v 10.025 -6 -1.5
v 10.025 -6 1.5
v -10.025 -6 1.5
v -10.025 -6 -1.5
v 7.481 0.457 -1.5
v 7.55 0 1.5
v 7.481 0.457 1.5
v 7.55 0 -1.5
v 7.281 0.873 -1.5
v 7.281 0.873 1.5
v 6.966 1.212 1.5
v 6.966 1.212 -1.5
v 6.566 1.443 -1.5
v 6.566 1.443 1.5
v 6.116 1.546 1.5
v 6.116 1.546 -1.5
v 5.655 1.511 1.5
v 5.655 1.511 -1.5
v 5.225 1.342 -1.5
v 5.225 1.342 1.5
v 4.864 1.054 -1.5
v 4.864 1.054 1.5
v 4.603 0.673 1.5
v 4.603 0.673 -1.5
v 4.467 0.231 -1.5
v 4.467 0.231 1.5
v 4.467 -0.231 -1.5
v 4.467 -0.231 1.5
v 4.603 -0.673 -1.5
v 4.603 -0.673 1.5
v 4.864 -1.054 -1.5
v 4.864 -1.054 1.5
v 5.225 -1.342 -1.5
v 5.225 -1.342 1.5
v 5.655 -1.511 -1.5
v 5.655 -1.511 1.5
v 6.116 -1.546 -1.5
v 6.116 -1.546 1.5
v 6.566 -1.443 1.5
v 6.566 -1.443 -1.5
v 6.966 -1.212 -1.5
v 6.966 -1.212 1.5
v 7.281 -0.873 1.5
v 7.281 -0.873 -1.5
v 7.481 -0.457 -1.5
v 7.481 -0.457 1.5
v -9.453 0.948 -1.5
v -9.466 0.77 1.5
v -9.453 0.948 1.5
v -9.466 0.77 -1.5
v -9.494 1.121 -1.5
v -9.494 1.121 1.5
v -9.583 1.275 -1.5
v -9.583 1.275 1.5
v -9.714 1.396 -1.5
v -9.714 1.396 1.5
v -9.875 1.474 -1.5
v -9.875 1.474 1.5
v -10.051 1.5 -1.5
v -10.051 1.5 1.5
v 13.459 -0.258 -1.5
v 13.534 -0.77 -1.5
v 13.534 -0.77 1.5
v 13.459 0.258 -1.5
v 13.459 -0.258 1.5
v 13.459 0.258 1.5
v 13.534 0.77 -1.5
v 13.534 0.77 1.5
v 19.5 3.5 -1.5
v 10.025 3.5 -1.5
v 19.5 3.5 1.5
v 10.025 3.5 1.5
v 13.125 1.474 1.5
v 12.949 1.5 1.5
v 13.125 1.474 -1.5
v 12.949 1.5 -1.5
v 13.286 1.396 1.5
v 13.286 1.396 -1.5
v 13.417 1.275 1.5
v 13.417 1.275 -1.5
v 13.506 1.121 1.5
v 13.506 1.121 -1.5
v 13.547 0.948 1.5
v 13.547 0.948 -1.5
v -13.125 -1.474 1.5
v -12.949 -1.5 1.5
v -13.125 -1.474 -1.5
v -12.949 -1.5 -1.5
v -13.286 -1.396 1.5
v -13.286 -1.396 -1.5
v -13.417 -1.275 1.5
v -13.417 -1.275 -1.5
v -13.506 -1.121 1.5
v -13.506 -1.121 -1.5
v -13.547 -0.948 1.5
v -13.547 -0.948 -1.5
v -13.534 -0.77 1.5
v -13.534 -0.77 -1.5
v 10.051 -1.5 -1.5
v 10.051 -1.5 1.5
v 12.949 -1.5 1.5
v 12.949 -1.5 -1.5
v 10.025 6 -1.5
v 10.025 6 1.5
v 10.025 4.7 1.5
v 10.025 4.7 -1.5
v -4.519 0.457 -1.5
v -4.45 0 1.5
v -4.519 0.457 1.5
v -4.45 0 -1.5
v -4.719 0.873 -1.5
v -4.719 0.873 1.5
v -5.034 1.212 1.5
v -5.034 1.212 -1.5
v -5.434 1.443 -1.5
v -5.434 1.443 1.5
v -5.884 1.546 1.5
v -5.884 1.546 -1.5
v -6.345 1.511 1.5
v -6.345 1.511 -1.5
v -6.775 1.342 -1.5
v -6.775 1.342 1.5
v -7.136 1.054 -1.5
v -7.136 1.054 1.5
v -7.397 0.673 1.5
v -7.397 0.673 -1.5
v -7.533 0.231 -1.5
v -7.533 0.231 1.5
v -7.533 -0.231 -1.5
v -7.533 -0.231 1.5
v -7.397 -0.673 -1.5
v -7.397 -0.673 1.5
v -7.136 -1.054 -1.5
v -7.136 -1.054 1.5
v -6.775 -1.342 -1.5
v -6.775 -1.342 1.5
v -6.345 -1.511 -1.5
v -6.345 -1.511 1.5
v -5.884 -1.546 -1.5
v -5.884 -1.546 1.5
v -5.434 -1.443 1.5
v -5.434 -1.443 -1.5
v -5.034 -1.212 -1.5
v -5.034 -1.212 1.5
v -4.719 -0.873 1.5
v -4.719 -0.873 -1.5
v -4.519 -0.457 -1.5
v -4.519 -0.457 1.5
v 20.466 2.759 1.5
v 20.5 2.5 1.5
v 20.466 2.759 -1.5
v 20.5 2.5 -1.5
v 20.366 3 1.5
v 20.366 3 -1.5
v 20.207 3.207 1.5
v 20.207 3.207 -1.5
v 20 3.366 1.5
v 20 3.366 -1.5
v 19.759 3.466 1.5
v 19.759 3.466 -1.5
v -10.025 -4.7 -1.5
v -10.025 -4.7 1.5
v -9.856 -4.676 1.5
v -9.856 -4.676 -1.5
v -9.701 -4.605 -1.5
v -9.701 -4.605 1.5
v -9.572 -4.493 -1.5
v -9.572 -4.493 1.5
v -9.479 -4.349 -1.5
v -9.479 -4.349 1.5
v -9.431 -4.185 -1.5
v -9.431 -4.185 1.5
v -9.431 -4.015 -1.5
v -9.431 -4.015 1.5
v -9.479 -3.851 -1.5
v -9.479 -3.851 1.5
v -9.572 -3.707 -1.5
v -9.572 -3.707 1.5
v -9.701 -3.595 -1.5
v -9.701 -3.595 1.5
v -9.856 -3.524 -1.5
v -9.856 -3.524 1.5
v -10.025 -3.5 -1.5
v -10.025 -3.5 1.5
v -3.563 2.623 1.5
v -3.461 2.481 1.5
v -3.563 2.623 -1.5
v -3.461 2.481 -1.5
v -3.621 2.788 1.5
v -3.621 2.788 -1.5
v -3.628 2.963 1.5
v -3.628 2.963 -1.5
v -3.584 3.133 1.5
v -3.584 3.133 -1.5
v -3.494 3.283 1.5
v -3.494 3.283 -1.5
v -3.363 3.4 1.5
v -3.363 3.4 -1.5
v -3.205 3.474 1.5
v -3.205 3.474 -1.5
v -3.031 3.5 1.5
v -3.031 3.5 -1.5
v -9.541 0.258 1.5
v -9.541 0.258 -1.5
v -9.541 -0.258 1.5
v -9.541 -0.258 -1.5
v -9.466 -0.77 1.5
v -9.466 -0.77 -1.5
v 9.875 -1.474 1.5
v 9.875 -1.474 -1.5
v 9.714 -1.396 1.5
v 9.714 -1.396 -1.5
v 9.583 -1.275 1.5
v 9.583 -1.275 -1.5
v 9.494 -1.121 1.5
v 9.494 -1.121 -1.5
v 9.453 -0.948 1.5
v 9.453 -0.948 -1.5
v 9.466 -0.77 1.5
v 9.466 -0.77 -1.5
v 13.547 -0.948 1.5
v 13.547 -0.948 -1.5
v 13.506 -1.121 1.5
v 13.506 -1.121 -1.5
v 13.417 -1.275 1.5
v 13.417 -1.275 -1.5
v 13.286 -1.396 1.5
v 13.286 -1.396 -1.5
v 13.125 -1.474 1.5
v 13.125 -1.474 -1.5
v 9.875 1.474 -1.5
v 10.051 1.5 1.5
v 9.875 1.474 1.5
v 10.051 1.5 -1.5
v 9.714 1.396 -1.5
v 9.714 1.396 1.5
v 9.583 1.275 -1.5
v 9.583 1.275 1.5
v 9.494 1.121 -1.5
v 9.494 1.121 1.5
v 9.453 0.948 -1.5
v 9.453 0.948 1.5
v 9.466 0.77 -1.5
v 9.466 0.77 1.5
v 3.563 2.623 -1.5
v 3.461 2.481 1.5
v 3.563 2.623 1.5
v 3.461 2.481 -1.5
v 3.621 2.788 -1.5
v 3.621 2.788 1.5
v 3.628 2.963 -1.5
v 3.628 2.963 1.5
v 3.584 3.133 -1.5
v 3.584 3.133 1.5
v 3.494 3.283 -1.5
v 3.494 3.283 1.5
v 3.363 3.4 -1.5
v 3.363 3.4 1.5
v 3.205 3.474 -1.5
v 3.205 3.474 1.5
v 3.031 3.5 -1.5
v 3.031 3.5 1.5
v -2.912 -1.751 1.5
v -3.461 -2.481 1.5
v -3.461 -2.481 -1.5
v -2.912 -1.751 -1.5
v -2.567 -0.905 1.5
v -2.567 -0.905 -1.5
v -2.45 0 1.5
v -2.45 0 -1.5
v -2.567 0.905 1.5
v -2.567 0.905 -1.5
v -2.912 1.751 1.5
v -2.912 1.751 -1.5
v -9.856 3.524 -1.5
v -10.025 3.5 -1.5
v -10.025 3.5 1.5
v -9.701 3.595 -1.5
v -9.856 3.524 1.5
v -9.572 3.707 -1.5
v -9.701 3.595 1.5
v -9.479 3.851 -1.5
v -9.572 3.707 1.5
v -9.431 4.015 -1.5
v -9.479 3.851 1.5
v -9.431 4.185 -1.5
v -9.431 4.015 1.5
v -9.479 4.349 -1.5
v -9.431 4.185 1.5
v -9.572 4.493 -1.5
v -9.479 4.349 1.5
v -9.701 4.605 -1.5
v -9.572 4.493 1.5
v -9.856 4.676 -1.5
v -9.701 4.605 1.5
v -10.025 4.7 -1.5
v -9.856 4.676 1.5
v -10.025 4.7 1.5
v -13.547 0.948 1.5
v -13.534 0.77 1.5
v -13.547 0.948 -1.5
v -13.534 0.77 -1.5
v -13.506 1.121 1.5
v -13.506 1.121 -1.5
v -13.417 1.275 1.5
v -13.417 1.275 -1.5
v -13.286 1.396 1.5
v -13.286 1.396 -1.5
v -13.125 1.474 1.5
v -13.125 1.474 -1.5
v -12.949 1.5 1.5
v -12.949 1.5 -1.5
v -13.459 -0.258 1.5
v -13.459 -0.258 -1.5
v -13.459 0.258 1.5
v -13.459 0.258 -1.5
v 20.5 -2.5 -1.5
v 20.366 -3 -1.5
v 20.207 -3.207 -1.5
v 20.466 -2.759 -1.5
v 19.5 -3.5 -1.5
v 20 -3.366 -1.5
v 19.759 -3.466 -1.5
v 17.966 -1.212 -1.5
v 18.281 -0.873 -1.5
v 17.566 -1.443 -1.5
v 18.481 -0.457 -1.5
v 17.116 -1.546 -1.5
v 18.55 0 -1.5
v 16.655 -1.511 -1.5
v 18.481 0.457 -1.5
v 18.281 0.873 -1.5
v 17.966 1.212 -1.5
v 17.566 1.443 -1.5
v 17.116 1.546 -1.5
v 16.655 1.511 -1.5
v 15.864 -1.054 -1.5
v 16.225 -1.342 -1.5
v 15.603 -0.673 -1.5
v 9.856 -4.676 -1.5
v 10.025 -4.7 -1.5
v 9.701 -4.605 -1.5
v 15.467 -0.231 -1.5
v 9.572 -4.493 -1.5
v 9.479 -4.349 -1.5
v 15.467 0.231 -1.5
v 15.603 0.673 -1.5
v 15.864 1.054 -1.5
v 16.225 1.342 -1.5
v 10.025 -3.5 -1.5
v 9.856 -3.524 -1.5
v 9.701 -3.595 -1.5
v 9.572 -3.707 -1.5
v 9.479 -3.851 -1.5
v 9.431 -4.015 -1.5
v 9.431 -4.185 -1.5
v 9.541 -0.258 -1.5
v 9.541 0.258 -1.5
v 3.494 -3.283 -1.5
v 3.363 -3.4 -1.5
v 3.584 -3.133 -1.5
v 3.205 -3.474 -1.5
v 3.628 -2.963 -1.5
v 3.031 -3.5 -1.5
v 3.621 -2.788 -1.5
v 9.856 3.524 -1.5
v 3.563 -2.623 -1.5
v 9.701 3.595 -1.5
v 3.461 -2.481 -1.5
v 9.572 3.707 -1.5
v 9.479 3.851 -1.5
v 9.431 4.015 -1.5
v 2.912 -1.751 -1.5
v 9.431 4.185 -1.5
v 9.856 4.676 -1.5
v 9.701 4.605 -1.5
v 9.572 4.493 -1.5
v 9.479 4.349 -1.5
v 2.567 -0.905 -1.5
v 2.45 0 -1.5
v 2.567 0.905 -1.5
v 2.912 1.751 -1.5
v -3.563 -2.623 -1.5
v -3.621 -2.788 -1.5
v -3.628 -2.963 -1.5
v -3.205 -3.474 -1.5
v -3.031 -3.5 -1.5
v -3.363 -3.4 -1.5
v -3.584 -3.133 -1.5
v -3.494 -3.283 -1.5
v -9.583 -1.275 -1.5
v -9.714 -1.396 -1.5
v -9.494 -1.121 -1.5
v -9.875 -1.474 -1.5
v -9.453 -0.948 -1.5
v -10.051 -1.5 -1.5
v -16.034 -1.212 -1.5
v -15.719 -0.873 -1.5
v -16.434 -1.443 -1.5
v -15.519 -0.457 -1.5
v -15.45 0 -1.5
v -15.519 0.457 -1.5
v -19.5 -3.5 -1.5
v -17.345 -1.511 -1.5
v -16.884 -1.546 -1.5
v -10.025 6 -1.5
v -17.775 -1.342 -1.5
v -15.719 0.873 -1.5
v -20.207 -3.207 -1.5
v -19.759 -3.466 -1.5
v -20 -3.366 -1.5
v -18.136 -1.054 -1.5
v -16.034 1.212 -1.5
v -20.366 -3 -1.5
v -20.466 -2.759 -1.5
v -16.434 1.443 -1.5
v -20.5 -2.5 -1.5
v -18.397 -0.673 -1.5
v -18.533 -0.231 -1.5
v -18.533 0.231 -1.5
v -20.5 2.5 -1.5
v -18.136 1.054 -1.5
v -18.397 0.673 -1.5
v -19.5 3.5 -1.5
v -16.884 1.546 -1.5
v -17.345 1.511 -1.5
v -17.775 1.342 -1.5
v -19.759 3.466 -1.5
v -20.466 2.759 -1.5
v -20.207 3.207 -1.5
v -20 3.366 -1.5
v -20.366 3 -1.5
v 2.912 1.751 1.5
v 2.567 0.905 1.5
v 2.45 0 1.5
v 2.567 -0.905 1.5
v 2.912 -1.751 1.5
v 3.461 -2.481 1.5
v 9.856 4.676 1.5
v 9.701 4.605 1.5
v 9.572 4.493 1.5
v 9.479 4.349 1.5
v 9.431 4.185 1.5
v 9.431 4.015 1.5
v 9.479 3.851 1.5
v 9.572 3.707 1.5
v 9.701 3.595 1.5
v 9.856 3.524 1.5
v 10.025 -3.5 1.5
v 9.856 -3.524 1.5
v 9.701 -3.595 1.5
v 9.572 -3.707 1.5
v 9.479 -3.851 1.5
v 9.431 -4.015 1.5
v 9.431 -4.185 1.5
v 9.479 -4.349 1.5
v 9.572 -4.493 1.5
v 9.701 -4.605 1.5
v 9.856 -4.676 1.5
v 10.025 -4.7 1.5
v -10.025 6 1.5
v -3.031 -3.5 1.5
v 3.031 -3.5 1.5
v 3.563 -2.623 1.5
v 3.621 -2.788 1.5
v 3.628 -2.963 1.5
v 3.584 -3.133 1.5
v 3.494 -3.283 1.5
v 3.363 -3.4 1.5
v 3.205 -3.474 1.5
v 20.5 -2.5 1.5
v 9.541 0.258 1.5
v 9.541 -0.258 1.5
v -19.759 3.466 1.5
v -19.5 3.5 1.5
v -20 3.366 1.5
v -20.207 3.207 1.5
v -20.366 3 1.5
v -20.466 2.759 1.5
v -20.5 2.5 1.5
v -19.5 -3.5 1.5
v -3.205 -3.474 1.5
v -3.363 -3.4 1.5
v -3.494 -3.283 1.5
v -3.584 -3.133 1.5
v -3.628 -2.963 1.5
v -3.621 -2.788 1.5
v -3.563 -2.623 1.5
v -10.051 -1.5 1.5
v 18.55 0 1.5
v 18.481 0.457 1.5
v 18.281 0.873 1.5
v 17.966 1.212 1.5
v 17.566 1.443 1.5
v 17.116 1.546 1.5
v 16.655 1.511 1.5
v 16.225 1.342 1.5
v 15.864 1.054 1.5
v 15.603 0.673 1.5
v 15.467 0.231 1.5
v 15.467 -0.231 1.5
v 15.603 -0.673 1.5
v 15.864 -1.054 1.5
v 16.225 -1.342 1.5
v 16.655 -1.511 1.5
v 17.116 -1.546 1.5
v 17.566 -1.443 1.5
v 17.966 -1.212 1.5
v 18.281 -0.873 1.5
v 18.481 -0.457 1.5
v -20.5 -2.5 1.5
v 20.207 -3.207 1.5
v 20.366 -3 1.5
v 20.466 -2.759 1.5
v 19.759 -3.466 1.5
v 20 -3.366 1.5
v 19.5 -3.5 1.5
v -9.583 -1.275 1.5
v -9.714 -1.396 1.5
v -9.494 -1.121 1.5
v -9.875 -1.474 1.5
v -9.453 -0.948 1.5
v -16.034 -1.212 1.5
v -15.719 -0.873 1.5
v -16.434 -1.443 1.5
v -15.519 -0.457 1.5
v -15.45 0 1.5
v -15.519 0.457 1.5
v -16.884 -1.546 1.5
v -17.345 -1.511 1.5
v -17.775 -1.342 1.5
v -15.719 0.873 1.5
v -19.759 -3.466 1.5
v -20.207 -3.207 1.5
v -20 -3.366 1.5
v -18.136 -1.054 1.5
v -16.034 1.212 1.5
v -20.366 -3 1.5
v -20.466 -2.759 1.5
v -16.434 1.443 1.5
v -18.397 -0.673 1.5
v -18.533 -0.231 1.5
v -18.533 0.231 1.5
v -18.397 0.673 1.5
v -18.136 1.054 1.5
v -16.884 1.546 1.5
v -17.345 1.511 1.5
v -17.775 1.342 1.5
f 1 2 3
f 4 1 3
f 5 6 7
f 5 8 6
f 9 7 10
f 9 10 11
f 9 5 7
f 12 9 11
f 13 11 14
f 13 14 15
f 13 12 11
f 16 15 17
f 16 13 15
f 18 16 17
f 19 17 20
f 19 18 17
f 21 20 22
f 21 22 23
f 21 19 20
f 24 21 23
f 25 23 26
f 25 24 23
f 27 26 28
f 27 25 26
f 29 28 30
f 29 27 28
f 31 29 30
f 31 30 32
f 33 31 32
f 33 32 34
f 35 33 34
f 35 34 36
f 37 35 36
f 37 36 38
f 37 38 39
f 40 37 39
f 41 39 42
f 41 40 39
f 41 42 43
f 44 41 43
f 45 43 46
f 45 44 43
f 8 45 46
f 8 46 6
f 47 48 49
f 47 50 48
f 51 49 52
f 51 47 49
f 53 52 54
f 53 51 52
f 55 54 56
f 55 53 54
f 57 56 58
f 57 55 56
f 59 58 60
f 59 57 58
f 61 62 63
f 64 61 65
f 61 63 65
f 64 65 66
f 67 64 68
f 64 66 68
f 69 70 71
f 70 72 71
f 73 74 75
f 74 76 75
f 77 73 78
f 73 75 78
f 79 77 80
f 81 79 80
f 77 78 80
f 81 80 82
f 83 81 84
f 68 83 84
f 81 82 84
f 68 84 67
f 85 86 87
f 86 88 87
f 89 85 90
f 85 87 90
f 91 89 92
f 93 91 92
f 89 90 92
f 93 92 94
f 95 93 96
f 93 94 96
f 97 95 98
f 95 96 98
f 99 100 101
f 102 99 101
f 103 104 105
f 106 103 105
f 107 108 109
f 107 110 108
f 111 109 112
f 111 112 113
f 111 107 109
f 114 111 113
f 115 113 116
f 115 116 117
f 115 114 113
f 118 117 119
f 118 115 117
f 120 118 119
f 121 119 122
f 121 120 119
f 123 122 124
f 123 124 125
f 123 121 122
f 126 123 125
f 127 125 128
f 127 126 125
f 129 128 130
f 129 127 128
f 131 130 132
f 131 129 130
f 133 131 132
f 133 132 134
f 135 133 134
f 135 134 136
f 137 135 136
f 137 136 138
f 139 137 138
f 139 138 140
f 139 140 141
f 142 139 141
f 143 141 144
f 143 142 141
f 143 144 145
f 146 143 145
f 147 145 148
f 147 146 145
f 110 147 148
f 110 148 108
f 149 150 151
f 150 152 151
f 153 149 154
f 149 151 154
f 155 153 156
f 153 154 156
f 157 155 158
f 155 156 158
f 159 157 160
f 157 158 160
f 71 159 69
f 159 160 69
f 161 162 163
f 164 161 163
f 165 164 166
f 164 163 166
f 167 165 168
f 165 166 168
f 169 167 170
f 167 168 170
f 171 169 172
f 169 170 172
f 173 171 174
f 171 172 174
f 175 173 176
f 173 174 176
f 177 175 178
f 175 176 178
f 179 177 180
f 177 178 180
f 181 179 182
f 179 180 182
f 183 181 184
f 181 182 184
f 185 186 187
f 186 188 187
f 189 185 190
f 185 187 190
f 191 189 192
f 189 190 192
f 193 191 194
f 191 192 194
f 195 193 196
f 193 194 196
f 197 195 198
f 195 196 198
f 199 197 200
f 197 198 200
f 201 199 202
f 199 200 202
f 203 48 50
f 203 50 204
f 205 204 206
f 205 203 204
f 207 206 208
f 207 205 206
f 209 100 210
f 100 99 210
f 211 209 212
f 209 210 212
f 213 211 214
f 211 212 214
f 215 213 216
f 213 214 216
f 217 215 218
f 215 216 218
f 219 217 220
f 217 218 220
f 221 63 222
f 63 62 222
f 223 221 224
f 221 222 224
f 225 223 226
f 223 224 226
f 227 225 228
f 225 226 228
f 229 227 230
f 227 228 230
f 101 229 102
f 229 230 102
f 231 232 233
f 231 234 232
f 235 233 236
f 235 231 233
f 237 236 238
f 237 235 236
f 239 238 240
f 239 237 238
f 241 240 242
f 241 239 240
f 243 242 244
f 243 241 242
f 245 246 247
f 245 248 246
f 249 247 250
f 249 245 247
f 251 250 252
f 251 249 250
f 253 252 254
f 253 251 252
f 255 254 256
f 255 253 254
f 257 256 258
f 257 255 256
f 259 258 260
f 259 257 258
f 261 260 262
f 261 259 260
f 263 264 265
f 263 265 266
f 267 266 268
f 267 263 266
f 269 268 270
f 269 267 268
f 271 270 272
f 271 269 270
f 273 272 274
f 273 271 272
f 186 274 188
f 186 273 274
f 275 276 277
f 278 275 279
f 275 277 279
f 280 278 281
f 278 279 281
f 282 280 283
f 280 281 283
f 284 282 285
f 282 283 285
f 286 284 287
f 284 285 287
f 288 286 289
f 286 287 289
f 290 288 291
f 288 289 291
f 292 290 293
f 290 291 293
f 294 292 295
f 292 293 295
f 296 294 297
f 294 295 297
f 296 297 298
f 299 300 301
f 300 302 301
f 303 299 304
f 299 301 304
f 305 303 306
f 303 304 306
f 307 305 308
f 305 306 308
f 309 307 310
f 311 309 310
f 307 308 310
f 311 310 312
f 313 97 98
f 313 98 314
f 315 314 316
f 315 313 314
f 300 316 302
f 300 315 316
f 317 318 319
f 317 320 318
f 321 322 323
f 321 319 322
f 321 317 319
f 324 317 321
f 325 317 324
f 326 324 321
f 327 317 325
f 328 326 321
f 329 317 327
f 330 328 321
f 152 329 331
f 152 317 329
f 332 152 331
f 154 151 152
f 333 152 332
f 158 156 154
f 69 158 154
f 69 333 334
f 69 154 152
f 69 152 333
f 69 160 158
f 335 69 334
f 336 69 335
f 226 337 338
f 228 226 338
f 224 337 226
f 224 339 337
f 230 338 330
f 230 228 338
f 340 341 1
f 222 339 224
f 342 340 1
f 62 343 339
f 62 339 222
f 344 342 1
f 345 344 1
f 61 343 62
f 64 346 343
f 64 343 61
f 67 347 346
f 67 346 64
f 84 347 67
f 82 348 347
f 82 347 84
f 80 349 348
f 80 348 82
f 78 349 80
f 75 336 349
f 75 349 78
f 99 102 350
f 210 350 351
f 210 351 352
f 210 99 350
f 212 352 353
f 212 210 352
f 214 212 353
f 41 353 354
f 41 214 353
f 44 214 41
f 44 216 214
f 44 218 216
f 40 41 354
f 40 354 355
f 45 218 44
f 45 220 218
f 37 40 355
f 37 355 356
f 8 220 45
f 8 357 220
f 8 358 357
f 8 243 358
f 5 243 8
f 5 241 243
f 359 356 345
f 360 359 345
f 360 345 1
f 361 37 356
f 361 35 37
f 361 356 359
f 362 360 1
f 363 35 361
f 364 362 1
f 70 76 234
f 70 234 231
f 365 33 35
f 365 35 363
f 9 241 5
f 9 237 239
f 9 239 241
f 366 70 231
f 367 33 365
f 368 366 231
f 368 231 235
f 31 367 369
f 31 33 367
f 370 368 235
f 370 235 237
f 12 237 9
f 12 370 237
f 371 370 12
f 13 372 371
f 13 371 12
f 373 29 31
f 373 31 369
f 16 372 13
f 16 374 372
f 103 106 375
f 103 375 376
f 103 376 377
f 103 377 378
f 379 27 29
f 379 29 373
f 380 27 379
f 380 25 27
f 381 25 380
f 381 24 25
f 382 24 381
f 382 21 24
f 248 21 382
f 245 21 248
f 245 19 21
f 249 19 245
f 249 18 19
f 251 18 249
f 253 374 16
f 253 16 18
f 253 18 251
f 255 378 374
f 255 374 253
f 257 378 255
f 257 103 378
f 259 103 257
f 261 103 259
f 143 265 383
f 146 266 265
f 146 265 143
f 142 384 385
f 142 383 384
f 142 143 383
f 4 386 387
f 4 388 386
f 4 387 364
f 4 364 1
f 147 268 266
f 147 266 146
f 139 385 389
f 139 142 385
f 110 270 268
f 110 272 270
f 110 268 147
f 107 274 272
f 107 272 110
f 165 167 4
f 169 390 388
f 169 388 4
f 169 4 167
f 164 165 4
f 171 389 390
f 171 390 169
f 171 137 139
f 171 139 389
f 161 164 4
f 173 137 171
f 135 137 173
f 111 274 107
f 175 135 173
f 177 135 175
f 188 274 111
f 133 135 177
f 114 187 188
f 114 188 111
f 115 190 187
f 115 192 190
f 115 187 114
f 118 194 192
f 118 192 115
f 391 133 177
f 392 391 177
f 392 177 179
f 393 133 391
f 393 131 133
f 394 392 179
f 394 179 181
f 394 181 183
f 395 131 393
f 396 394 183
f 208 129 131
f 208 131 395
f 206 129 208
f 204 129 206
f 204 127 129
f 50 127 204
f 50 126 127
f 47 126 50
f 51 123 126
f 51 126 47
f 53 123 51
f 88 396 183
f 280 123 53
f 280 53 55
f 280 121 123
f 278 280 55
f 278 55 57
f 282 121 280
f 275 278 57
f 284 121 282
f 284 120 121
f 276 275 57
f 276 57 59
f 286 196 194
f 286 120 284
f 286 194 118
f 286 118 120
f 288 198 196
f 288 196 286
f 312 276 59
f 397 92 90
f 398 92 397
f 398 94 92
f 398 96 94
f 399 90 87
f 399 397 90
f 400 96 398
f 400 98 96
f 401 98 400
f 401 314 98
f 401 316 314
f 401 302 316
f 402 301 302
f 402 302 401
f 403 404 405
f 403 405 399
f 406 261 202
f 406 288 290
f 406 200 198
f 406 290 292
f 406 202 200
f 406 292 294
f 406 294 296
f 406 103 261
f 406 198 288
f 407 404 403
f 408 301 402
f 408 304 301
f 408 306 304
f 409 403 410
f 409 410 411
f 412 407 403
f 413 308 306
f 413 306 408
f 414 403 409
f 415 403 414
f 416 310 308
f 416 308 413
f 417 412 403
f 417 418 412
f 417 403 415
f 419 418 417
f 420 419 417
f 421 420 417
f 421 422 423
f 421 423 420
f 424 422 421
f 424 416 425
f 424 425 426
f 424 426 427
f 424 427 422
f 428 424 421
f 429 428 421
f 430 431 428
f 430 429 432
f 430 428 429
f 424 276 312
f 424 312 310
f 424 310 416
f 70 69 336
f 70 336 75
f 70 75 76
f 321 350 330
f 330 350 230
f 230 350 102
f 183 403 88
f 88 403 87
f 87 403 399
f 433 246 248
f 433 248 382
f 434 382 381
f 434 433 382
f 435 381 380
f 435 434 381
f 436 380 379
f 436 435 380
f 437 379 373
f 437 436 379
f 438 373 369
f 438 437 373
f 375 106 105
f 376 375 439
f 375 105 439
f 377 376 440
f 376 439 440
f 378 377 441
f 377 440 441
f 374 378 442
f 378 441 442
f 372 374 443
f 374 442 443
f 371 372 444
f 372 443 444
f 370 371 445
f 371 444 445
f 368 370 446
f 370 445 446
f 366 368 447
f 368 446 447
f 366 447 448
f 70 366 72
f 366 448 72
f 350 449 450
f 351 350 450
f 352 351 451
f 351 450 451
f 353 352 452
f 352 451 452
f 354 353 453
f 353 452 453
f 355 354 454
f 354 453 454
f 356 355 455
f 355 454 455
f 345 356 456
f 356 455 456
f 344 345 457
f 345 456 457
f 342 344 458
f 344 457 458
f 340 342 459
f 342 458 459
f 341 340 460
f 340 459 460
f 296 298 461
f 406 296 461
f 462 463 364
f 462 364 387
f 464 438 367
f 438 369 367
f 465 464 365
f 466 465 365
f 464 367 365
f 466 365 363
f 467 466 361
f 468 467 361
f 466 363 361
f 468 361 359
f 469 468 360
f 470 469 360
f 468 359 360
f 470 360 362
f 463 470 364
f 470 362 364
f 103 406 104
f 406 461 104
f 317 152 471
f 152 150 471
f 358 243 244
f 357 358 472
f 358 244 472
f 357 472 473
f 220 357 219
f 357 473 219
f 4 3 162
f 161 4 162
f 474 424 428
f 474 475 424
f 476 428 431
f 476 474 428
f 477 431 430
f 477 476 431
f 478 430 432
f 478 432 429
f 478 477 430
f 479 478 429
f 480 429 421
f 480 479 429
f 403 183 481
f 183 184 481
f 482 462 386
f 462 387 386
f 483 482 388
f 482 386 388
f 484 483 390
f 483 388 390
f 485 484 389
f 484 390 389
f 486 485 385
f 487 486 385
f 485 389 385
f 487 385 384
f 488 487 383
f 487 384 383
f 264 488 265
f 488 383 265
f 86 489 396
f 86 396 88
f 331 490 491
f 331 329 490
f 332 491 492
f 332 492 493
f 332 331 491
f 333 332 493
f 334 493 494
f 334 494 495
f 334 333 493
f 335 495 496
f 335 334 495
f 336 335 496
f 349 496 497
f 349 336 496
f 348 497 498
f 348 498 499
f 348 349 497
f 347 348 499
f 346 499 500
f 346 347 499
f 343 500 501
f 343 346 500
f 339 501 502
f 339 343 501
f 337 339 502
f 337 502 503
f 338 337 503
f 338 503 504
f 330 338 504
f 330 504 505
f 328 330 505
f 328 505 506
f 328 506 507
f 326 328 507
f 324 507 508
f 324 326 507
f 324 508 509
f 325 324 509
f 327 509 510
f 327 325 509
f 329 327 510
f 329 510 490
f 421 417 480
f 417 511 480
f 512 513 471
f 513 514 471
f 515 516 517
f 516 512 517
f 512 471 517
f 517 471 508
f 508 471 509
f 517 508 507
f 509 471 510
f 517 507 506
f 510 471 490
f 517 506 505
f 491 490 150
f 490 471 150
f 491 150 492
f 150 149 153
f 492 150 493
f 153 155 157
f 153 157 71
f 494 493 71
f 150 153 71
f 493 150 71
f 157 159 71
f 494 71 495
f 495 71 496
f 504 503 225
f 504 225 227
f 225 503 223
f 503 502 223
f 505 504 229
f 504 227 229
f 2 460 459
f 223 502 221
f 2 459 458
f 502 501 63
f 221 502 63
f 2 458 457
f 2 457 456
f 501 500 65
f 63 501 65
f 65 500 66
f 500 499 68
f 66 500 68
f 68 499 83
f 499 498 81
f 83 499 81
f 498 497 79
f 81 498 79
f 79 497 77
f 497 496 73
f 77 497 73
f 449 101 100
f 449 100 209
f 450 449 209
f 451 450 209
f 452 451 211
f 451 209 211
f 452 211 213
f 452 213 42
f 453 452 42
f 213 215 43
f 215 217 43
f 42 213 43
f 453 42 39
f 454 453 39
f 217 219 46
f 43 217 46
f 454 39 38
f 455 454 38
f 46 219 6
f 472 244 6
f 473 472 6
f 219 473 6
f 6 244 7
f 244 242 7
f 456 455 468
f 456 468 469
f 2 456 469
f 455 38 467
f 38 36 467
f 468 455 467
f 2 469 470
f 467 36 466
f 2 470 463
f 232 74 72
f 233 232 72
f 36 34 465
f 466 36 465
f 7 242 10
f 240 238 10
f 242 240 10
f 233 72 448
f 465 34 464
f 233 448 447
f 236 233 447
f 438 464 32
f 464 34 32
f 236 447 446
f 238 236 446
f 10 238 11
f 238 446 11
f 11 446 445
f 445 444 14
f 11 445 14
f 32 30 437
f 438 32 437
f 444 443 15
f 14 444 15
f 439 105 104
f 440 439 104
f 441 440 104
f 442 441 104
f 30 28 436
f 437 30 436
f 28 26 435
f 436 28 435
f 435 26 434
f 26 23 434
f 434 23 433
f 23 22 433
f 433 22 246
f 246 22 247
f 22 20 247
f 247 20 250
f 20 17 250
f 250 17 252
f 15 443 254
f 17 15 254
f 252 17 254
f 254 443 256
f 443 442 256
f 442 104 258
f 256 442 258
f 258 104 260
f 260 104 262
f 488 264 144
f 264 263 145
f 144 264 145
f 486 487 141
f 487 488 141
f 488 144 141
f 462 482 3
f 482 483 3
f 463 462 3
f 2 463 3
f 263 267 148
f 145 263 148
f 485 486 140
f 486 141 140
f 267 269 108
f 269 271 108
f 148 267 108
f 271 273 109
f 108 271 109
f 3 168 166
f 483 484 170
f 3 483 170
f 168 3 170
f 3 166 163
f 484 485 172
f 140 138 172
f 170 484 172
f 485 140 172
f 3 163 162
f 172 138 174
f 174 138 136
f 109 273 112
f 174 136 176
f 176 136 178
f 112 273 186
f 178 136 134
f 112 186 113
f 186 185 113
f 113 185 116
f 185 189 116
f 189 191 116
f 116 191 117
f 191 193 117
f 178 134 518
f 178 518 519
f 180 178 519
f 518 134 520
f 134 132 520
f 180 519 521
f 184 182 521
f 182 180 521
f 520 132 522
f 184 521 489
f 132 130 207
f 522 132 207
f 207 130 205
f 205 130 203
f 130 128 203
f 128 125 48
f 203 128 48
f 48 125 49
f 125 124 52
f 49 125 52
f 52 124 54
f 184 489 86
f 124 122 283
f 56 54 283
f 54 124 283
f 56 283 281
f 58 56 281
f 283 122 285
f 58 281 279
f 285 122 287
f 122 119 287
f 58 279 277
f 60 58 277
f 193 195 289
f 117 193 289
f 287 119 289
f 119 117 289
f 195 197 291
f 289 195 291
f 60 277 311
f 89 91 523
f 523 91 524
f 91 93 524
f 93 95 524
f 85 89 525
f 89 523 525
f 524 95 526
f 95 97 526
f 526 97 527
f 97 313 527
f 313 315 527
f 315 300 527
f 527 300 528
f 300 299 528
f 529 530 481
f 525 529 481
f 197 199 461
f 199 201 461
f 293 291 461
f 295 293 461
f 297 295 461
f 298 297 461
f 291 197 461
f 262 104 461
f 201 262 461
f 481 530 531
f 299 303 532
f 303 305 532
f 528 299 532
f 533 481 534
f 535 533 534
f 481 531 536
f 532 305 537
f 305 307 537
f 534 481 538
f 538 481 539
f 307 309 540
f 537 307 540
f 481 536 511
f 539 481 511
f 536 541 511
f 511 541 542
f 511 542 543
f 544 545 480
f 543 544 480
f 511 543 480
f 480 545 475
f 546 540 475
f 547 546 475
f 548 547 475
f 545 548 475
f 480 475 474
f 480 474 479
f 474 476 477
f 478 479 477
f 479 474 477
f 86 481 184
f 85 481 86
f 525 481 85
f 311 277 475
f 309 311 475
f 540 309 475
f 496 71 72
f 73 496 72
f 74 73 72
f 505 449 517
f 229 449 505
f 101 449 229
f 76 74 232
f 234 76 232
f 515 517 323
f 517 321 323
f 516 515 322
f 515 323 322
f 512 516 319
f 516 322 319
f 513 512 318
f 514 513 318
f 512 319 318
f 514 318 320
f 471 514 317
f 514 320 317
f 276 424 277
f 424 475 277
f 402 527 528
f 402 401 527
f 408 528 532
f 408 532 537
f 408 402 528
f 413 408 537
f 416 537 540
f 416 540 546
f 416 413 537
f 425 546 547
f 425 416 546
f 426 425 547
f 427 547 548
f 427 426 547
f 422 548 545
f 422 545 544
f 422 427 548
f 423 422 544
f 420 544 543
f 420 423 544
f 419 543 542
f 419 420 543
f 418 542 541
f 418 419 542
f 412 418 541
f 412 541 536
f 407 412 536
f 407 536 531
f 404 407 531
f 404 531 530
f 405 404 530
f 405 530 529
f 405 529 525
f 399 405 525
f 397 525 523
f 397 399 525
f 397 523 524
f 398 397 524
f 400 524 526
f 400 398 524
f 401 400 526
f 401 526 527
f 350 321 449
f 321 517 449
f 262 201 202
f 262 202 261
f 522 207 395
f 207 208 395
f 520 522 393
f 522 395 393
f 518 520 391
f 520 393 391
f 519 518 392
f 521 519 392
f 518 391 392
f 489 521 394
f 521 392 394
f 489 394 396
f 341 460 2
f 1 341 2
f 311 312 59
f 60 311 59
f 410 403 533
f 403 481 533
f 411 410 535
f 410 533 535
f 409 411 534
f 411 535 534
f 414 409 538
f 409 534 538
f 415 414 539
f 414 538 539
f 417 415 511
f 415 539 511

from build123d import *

# Parameters (mm, degrees)
SKETCH_1_R               = 1.55
EXTRUDE_1_DEPTH          = 1.5
SKETCH_2_R               = 0.6
CUT_EXTRUDE_1_DEPTH      = 1
CUT_EXTRUDE_1_DEPTH_BACK = 4
FILLET_1_R               = 1
CUT_EXTRUDE_2_DEPTH      = 4
FILLET_2_R               = 0.6


with BuildPart() as part:
    # 草图1 → 凸台-拉伸1 (new body, symmetric)
    with BuildSketch(Plane.XY):
        Polygon((-20.5, 3.5), (-10.025, 3.5), (-10.025, 6), (10.025, 6), (10.025, 3.5), (20.5, 3.5), (20.5, -3.5), (10.025, -3.5), (10.025, -6), (-10.025, -6), (-10.025, -3.5), (-20.5, -3.5), align=None)
        with Locations((-17, 0)):
            Circle(SKETCH_1_R, mode=Mode.SUBTRACT)
        with Locations((-6, 0)):
            Circle(SKETCH_1_R, mode=Mode.SUBTRACT)
        with Locations((6, 0)):
            Circle(SKETCH_1_R, mode=Mode.SUBTRACT)
        with Locations((17, 0)):
            Circle(SKETCH_1_R, mode=Mode.SUBTRACT)
    extrude(amount=EXTRUDE_1_DEPTH, both=True)

    # 草图2 → 切除-拉伸1 (cut, two sides)
    with BuildSketch(Plane.XY.offset(1.5)) as cut_extrude_1_sk:
        with Locations((-10.025, 4.1)):
            Circle(SKETCH_2_R)
        with Locations((-10.025, -4.1)):
            Circle(SKETCH_2_R)
        with Locations((10.025, 4.1)):
            Circle(SKETCH_2_R)
        with Locations((10.025, -4.1)):
            Circle(SKETCH_2_R)
    extrude(amount=CUT_EXTRUDE_1_DEPTH, mode=Mode.SUBTRACT)
    extrude(cut_extrude_1_sk.sketch, amount=-CUT_EXTRUDE_1_DEPTH_BACK, mode=Mode.SUBTRACT)

    # 圆角1
    fillet_1_edges = [part.edges().sort_by_distance(p)[0] for p in [
        (20.5, -3.5, 0),
        (20.5, 3.5, 0),
        (-20.5, -3.5, 0),
        (-20.5, 3.5, 0),
    ]]
    fillet(fillet_1_edges, radius=FILLET_1_R)

    # 草图4 → 切除-拉伸2 (cut, through all)
    with BuildSketch(Plane.XY.offset(1.5)):
        with BuildLine():
            Line((-13.782469891, 1.5), (-9.217530109, 1.5))
            ThreePointArc((-9.217530109, 1.5), (-9.55, 0), (-9.217530109, -1.5))
            Line((-9.217530109, -1.5), (-13.782469891, -1.5))
            ThreePointArc((-13.782469891, -1.5), (-13.45, 0), (-13.782469891, 1.5))
        make_face()
        with BuildLine():
            Line((-5.406282896, 3.5), (5.406282896, 3.5))
            ThreePointArc((5.406282896, 3.5), (2.45, 0), (5.406282896, -3.5))
            Line((5.406282896, -3.5), (-5.406282896, -3.5))
            ThreePointArc((-5.406282896, -3.5), (-2.45, 0), (-5.406282896, 3.5))
        make_face()
        with BuildLine():
            Line((13.782469891, 1.5), (9.217530109, 1.5))
            ThreePointArc((9.217530109, 1.5), (9.55, 0), (9.217530109, -1.5))
            Line((9.217530109, -1.5), (13.782469891, -1.5))
            ThreePointArc((13.782469891, -1.5), (13.45, 0), (13.782469891, 1.5))
        make_face()
    extrude(amount=-CUT_EXTRUDE_2_DEPTH, mode=Mode.SUBTRACT)

    # 圆角2
    fillet_2_edges = [part.edges().sort_by_distance(p)[0] for p in [
        (-13.782469891, -1.5, 0),
        (-13.782469891, 1.5, 0),
        (-9.217530109, 1.5, 0),
        (-9.217530109, -1.5, 0),
        (-5.406282896, -3.5, 0),
        (-5.406282896, 3.5, 0),
        (5.406282896, 3.5, 0),
        (5.406282896, -3.5, 0),
        (13.782469891, 1.5, 0),
        (13.782469891, -1.5, 0),
        (9.217530109, -1.5, 0),
        (9.217530109, 1.5, 0),
    ]]
    fillet(fillet_2_edges, radius=FILLET_2_R)


solid = part.part
